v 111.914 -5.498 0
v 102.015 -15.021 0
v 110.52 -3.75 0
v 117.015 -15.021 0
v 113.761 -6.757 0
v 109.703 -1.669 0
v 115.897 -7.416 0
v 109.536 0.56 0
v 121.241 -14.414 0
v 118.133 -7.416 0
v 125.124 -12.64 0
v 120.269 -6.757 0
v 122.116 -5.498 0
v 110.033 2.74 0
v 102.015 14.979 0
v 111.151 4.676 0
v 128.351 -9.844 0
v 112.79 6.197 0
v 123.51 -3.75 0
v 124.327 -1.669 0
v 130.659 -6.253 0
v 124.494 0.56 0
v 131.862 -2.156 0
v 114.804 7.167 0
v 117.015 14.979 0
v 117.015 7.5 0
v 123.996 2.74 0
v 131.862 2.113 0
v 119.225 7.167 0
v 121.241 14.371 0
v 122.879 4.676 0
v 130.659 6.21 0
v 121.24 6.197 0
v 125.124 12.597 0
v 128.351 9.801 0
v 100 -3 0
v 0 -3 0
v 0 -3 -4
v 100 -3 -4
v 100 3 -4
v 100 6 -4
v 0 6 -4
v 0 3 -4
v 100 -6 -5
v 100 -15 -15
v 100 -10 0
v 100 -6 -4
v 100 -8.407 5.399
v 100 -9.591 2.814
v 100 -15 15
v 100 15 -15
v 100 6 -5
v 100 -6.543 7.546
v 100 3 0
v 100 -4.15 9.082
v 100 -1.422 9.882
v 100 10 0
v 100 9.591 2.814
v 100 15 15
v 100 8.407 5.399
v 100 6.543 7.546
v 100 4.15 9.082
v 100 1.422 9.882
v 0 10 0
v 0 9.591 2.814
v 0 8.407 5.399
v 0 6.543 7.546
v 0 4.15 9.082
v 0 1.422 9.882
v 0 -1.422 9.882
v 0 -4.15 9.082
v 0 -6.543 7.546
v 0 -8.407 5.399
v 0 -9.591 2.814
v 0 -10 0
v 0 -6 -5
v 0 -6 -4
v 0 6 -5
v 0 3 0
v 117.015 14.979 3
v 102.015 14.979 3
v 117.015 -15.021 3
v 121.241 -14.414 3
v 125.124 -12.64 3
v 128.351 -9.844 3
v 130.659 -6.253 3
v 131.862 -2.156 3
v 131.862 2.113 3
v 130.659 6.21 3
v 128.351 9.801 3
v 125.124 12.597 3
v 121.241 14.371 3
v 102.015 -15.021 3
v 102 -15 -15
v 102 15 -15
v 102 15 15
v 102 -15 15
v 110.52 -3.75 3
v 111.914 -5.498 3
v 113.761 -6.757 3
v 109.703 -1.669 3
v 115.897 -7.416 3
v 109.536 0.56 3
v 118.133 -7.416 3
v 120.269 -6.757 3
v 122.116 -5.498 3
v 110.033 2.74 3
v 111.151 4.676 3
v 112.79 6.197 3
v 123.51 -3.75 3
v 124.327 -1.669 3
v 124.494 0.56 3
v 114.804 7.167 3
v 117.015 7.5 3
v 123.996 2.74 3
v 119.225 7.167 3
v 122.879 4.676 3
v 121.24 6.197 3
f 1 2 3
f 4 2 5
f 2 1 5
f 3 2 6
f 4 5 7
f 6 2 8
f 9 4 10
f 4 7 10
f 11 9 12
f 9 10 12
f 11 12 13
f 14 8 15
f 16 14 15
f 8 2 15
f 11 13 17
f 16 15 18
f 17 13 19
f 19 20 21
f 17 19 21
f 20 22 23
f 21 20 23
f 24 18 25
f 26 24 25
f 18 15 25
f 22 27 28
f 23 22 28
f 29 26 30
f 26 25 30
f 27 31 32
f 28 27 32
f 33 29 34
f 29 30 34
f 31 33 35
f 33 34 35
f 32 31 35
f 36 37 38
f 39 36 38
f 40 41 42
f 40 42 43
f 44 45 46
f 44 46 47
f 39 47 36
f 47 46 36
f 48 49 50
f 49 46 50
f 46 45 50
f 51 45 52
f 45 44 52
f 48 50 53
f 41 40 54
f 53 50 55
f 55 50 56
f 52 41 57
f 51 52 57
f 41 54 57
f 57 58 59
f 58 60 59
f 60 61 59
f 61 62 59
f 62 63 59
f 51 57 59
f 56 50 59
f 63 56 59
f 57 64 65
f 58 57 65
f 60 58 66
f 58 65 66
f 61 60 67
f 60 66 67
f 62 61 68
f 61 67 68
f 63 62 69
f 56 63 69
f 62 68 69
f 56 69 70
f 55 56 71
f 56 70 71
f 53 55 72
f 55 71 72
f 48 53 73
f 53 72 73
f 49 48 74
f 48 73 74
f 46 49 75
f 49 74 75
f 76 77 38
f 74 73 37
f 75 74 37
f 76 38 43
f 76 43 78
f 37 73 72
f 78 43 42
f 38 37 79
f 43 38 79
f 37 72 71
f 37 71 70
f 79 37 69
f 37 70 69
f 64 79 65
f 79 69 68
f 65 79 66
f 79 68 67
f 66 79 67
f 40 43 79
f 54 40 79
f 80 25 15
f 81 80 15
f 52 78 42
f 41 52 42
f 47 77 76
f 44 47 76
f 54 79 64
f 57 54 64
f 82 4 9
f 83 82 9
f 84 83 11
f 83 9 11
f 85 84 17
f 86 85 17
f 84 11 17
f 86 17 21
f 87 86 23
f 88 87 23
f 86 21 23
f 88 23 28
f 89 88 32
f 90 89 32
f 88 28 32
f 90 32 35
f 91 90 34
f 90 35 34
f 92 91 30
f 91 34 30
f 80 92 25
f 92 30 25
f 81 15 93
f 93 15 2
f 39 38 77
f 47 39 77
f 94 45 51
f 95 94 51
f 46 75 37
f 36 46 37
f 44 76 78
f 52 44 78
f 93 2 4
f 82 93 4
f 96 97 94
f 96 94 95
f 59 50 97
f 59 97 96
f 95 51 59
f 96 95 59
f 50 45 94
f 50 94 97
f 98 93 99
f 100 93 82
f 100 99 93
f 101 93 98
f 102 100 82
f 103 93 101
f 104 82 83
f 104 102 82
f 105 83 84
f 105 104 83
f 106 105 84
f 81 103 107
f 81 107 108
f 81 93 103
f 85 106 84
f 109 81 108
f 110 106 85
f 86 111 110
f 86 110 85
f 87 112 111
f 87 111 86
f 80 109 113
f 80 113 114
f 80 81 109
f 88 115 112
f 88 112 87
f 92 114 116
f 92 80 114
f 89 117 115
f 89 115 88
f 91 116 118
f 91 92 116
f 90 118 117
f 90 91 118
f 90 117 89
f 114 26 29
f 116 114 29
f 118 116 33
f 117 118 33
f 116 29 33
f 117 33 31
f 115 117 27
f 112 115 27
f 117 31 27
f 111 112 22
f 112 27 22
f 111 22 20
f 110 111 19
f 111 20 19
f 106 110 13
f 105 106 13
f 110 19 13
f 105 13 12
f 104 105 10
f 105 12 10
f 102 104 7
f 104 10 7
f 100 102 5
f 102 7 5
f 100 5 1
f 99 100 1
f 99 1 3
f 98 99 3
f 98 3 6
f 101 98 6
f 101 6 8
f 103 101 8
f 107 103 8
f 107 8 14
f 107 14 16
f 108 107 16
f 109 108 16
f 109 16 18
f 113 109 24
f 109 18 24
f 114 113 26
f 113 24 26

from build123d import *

# Parameters (mm, degrees)
F1_DEPTH = 100
F2_W     = 30
F2_H     = 30
F3_DEPTH = 2
F7_DEPTH = 3


with BuildPart() as f1:
    # F0 (on Right) → F1 (new body)
    with BuildSketch(Plane.YZ):
        with BuildLine():
            Line((3, 0), (10, 0))
            ThreePointArc((10, 0), (0, 9.9840104625), (-10, 0))
            Line((-10, 0), (-3, 0))
            Line((-3, 0), (-3, -4))
            Line((-3, -4), (-6, -4))
            Line((-6, -4), (-6, -5))
            Line((-6, -5), (6, -5))
            Line((6, -5), (6, -4))
            Line((6, -4), (3, -4))
            Line((3, -4), (3, 0))
        make_face()
    extrude(amount=F1_DEPTH)

    # F2 (on face) → F3 (join)
    with BuildSketch(Plane.YZ.offset(100)):
        Rectangle(F2_W, F2_H)
    extrude(amount=F3_DEPTH)


with BuildPart() as f7:
    # F6 (on plane+point) → F7 (new body)
    with BuildSketch(Plane.XY):
        with BuildLine():
            Line((117.0148004173, 14.9785418622), (102.0148004173, 14.9785418622))
            Line((102.0148004173, 14.9785418622), (102.0148004173, -15.0214581378))
            Line((102.0148004173, -15.0214581378), (117.0148004173, -15.0214581378))
            Line((117.0148004173, -15.0214581378), (117.0148004173, -7.5))
            ThreePointArc((117.0148004173, -7.5), (109.5148004173, 0), (117.0148004173, 7.5))
            Line((117.0148004173, 7.5), (117.0148004173, 14.9785418622))
        make_face()
        with BuildLine():
            ThreePointArc((117.0148004173, -15.0214581378), (132.0148004173, -0.0214581378), (117.0148004173, 14.9785418622))
            Line((117.0148004173, 14.9785418622), (117.0148004173, 7.5))
            ThreePointArc((117.0148004173, 7.5), (122.3181012762, 5.3033008589), (124.5148004173, 0))
            ThreePointArc((124.5148004173, 0), (122.3181012762, -5.3033008589), (117.0148004173, -7.5))
            Line((117.0148004173, -7.5), (117.0148004173, -15.0214581378))
        make_face()
    extrude(amount=F7_DEPTH)


solid = Compound([f1.part, f7.part])
